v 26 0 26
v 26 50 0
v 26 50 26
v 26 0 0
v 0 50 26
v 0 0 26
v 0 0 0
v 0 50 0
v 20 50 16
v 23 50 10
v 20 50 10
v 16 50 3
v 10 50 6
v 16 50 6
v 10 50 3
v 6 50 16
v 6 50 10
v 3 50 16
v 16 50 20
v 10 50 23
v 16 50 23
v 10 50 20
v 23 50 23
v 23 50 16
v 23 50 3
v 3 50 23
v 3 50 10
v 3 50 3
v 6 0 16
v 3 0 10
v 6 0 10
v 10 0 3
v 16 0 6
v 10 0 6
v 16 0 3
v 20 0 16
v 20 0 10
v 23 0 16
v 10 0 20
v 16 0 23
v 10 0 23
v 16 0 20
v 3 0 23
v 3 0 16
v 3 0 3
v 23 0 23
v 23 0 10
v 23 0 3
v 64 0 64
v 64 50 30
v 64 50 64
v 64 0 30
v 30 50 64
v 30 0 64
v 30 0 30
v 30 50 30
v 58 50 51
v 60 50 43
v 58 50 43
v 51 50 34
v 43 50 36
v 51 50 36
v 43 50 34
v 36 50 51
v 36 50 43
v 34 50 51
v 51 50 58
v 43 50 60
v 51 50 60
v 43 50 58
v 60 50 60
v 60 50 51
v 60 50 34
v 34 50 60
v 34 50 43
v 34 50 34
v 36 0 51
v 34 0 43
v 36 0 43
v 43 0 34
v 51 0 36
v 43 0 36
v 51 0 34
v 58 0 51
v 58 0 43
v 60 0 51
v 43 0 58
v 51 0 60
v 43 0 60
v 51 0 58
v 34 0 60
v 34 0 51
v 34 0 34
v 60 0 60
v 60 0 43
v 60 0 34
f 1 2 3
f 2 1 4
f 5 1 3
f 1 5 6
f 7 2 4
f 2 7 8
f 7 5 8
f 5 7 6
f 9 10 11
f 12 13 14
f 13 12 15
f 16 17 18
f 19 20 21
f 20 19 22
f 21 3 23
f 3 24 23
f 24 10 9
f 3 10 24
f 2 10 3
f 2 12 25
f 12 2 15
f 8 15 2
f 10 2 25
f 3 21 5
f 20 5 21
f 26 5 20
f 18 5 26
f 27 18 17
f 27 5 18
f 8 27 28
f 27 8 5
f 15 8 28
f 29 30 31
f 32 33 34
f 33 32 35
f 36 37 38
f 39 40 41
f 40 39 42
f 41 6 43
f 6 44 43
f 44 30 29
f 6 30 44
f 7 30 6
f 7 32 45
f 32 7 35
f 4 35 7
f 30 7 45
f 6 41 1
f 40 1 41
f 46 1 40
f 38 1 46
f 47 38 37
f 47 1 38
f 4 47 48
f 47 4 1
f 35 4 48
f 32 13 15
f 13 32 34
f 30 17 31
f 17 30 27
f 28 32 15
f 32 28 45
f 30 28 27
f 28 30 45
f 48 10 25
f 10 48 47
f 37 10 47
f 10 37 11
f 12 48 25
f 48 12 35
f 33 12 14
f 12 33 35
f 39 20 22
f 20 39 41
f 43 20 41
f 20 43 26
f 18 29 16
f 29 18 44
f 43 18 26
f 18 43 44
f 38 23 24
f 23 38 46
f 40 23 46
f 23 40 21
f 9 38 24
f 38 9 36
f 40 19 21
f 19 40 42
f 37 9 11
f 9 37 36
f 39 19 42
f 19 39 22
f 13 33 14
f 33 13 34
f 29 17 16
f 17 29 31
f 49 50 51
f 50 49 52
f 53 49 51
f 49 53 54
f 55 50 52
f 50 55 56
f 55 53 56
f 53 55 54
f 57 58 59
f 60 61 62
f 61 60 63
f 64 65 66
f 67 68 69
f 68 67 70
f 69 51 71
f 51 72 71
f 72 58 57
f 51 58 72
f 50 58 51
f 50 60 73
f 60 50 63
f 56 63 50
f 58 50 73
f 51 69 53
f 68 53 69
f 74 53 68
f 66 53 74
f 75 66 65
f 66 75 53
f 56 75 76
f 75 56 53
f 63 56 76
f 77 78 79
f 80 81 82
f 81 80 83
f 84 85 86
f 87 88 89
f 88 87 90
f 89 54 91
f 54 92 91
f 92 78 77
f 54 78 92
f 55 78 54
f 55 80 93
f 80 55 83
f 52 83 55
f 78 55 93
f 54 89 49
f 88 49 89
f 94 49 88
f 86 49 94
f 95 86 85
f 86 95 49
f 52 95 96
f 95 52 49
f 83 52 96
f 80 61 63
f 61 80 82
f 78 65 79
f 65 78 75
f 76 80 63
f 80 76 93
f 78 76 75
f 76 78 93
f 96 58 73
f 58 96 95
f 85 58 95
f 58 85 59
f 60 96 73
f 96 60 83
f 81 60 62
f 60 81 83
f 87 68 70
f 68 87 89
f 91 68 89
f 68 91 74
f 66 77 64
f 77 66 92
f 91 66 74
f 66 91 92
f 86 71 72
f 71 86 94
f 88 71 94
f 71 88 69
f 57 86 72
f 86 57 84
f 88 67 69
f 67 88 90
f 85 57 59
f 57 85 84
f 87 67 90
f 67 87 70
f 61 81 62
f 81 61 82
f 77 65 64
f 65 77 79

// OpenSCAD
$fa=0.5; // default minimum facet angle is now 0.5
$fs=0.5; // default minimum facet size is now 0.5 mm

module tube_profile_Y(x, y, z, longueur, epaisseur = 3, epaisseur_bloc = 3, largeur_bloc = 6, largeur_profile = 20)
{
    ecart = (largeur_profile - largeur_bloc)/2;
    
    difference()
    {
        translate([x,y,z])
        cube([largeur_profile+2*epaisseur, longueur, largeur_profile+2*epaisseur]);
        
        translate([x+epaisseur,y-1,z+epaisseur])
        #cube([ecart,longueur+2,ecart]);
        
        translate([x+epaisseur+ecart+largeur_bloc,y-1,z+epaisseur])
        #cube([ecart,longueur+2,ecart]);
        
        translate([x+epaisseur,y-1,z+epaisseur+ecart+largeur_bloc])
        #cube([ecart,longueur+2,ecart]);
        
        translate([x+epaisseur+ecart+largeur_bloc,y-1,z+epaisseur+ecart+largeur_bloc])
        #cube([ecart,longueur+2,ecart]);
        
        translate([x+epaisseur+epaisseur_bloc,y-1,z+epaisseur+epaisseur_bloc])
        #cube([largeur_profile-2*epaisseur_bloc,longueur+2,largeur_profile-2*epaisseur_bloc]);
    }
}
tube_profile_Y(0,0,0,50);
tube_profile_Y(x=30,y=0,z=30,longueur=50,epaisseur=4,epaisseur_bloc=2,largeur_bloc=8,largeur_profile=26);
